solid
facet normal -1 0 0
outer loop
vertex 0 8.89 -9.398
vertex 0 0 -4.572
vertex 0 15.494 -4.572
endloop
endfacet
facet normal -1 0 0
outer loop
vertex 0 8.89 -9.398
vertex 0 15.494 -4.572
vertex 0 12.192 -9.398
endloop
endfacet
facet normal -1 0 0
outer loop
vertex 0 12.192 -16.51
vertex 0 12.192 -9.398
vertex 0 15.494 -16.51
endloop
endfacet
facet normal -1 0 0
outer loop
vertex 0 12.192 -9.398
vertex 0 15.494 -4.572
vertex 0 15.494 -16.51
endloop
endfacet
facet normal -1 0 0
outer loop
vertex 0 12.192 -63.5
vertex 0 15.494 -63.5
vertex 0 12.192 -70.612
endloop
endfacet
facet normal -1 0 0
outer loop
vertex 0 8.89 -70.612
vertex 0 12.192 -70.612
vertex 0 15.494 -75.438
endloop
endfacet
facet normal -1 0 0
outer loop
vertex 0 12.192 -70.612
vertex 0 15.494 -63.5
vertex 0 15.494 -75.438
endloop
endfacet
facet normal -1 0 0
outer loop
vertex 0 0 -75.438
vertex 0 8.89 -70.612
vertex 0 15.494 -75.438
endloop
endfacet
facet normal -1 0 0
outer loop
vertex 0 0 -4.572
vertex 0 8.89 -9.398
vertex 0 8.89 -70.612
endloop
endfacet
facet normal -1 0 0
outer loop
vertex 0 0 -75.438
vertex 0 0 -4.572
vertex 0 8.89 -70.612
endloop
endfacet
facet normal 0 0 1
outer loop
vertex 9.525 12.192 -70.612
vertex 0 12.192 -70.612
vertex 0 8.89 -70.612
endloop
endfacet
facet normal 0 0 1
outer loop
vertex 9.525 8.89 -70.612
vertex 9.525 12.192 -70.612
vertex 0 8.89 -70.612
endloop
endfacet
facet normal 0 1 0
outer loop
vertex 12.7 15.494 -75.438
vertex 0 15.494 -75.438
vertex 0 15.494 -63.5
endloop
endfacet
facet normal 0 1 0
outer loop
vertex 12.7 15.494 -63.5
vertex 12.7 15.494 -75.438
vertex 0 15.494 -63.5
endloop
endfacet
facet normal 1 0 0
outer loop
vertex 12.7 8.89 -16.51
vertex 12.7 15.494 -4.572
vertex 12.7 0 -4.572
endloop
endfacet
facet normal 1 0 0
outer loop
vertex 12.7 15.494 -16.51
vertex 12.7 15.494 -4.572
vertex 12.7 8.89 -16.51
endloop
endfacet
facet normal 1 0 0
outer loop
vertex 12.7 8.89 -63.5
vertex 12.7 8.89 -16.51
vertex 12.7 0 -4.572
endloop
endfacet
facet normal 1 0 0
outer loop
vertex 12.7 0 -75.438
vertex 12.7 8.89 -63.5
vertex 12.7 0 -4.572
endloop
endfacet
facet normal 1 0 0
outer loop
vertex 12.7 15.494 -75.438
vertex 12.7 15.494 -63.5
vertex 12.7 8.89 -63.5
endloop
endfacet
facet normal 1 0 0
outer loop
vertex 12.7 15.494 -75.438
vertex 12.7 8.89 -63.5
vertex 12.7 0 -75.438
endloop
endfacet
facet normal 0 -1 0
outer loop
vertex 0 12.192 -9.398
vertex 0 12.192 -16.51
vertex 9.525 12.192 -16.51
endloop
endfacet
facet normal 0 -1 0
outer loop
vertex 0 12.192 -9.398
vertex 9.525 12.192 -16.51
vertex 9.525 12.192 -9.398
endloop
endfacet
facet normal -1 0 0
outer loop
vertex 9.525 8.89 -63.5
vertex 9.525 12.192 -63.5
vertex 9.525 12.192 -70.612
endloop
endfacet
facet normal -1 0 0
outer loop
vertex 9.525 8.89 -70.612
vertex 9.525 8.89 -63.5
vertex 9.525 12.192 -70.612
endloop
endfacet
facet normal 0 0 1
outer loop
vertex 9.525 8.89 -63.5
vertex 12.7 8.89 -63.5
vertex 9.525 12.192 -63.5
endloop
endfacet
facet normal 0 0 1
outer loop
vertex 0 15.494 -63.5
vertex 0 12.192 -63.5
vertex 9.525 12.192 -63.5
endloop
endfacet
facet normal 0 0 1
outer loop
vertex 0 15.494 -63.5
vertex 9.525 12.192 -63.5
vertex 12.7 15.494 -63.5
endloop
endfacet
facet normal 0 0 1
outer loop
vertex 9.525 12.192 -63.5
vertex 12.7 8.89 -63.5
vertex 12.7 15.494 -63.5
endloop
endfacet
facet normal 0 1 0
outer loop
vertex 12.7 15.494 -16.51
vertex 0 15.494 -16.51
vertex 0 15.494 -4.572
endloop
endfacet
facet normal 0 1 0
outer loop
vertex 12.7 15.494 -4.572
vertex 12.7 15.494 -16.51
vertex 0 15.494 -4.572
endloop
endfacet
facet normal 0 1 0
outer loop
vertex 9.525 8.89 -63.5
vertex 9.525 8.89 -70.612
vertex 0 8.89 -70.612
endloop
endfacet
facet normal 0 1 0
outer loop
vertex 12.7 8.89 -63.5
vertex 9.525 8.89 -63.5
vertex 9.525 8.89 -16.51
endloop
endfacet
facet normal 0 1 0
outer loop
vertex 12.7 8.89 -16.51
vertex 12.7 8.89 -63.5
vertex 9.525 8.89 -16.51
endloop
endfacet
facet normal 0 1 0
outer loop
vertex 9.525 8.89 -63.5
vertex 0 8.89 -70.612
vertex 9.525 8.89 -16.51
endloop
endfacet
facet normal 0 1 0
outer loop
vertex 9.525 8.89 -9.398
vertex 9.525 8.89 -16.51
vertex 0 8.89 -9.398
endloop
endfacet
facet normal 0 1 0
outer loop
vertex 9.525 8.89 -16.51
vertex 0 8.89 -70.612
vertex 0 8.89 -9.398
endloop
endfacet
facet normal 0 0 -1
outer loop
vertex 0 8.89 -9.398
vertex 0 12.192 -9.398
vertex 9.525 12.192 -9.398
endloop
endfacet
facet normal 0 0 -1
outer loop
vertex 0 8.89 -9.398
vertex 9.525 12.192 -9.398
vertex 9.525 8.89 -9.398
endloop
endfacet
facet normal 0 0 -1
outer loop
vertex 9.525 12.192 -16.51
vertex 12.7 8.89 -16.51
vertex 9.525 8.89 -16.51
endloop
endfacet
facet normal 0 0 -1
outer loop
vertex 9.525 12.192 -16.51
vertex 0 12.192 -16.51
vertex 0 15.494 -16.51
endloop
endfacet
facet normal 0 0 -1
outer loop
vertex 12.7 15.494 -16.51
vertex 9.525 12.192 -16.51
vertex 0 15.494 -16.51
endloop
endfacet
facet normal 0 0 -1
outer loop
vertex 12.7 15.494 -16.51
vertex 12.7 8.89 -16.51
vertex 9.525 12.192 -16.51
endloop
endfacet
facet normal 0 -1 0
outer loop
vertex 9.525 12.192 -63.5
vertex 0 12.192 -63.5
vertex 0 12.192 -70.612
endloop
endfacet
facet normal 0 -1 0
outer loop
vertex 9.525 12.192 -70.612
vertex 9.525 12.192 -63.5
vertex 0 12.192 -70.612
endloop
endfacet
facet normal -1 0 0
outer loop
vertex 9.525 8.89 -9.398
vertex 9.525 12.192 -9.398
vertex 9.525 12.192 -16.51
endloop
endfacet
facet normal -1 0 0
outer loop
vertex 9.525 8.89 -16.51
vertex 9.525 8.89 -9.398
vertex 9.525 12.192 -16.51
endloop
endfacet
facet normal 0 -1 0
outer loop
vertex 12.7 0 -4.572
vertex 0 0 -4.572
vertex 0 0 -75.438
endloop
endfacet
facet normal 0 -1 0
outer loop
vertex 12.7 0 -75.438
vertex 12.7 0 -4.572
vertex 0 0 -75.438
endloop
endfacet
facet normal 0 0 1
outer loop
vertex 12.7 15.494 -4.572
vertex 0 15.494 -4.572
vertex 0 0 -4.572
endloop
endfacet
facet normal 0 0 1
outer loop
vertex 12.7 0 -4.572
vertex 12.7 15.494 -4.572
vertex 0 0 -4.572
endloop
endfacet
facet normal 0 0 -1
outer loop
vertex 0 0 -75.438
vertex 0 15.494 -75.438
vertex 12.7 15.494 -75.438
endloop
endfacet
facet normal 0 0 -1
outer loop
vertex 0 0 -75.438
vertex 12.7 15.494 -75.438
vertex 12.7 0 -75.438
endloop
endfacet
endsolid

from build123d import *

# Parameters (mm, degrees)
BOSS_EXTRUDE1_DEPTH = 12.7
BOSS_EXTRUDE3_DEPTH = 12.7
CUT_EXTRUDE1_REACH  = 14.7
CUT_EXTRUDE2_REACH  = 14.7
SKETCH6_W           = 7.112
SKETCH6_H           = 3.302
BOSS_EXTRUDE4_DEPTH = 3.175
SKETCH7_W           = 7.112
SKETCH7_H           = 3.302
BOSS_EXTRUDE5_DEPTH = 3.175


with BuildPart() as part:
    # Sketch1 → Boss-Extrude1 (new body)
    with BuildSketch(Plane(origin=(0, 0, 0), x_dir=(0, 0, -1), z_dir=(1, 0, 0))):
        Polygon((0, 0), (80.01, 0), (80.01, 19.05), (71.12, 19.05), (71.12, 8.89), (8.89, 8.89), (8.89, 19.05), (0, 19.05), align=None)
    extrude(amount=BOSS_EXTRUDE1_DEPTH)

    # Sketch2 → Boss-Extrude3 (add)
    with BuildSketch(Plane.ZY):
        Polygon((-63.5, 12.192), (-70.612, 12.192), (-70.612, 8.89), (-74.93, 8.89), (-74.93, 15.494), (-63.5, 15.494), align=None)
        Polygon((-16.51, 12.192), (-9.398, 12.192), (-9.398, 8.89), (-5.08, 8.89), (-5.08, 15.494), (-16.51, 15.494), align=None)
    extrude(amount=-BOSS_EXTRUDE3_DEPTH)

    # Sketch4 → Cut-Extrude1 (cut, up to next)
    with BuildSketch(Plane.ZY, mode=Mode.PRIVATE) as cut_extrude1_sk1:
        Polygon((-71.12, 15.494), (-75.438, 15.494), (-75.438, 0), (-80.01, 0), (-80.01, 19.05), (-71.12, 19.05), align=None)
    cut_extrude1_tool1 = extrude(cut_extrude1_sk1.sketch, amount=-CUT_EXTRUDE1_REACH, mode=Mode.PRIVATE) & part.part
    add(cut_extrude1_tool1.solids().sort_by_distance((0, 10.686074, -77.05781))[0], mode=Mode.SUBTRACT)

    # Sketch5 → Cut-Extrude2 (cut, up to next)
    with BuildSketch(Plane.ZY, mode=Mode.PRIVATE) as cut_extrude2_sk1:
        Polygon((-8.89, 15.494), (-4.572, 15.494), (-4.572, 0), (0, 0), (0, 19.05), (-8.89, 19.05), align=None)
    cut_extrude2_tool1 = extrude(cut_extrude2_sk1.sketch, amount=-CUT_EXTRUDE2_REACH, mode=Mode.PRIVATE) & part.part
    add(cut_extrude2_tool1.solids().sort_by_distance((0, 10.686074, -2.95219))[0], mode=Mode.SUBTRACT)

    # Sketch6 → Boss-Extrude4 (add)
    with BuildSketch(Plane(origin=(12.7, 0, 0), x_dir=(0, 0, -1), z_dir=(1, 0, 0))):
        with Locations((12.954, 10.541)):
            Rectangle(SKETCH6_W, SKETCH6_H)
    extrude(amount=-BOSS_EXTRUDE4_DEPTH)

    # Sketch7 → Boss-Extrude5 (add)
    with BuildSketch(Plane(origin=(12.7, 0, 0), x_dir=(0, 0, -1), z_dir=(1, 0, 0))):
        with Locations((67.056, 10.541)):
            Rectangle(SKETCH7_W, SKETCH7_H)
    extrude(amount=-BOSS_EXTRUDE5_DEPTH)


solid = part.part
